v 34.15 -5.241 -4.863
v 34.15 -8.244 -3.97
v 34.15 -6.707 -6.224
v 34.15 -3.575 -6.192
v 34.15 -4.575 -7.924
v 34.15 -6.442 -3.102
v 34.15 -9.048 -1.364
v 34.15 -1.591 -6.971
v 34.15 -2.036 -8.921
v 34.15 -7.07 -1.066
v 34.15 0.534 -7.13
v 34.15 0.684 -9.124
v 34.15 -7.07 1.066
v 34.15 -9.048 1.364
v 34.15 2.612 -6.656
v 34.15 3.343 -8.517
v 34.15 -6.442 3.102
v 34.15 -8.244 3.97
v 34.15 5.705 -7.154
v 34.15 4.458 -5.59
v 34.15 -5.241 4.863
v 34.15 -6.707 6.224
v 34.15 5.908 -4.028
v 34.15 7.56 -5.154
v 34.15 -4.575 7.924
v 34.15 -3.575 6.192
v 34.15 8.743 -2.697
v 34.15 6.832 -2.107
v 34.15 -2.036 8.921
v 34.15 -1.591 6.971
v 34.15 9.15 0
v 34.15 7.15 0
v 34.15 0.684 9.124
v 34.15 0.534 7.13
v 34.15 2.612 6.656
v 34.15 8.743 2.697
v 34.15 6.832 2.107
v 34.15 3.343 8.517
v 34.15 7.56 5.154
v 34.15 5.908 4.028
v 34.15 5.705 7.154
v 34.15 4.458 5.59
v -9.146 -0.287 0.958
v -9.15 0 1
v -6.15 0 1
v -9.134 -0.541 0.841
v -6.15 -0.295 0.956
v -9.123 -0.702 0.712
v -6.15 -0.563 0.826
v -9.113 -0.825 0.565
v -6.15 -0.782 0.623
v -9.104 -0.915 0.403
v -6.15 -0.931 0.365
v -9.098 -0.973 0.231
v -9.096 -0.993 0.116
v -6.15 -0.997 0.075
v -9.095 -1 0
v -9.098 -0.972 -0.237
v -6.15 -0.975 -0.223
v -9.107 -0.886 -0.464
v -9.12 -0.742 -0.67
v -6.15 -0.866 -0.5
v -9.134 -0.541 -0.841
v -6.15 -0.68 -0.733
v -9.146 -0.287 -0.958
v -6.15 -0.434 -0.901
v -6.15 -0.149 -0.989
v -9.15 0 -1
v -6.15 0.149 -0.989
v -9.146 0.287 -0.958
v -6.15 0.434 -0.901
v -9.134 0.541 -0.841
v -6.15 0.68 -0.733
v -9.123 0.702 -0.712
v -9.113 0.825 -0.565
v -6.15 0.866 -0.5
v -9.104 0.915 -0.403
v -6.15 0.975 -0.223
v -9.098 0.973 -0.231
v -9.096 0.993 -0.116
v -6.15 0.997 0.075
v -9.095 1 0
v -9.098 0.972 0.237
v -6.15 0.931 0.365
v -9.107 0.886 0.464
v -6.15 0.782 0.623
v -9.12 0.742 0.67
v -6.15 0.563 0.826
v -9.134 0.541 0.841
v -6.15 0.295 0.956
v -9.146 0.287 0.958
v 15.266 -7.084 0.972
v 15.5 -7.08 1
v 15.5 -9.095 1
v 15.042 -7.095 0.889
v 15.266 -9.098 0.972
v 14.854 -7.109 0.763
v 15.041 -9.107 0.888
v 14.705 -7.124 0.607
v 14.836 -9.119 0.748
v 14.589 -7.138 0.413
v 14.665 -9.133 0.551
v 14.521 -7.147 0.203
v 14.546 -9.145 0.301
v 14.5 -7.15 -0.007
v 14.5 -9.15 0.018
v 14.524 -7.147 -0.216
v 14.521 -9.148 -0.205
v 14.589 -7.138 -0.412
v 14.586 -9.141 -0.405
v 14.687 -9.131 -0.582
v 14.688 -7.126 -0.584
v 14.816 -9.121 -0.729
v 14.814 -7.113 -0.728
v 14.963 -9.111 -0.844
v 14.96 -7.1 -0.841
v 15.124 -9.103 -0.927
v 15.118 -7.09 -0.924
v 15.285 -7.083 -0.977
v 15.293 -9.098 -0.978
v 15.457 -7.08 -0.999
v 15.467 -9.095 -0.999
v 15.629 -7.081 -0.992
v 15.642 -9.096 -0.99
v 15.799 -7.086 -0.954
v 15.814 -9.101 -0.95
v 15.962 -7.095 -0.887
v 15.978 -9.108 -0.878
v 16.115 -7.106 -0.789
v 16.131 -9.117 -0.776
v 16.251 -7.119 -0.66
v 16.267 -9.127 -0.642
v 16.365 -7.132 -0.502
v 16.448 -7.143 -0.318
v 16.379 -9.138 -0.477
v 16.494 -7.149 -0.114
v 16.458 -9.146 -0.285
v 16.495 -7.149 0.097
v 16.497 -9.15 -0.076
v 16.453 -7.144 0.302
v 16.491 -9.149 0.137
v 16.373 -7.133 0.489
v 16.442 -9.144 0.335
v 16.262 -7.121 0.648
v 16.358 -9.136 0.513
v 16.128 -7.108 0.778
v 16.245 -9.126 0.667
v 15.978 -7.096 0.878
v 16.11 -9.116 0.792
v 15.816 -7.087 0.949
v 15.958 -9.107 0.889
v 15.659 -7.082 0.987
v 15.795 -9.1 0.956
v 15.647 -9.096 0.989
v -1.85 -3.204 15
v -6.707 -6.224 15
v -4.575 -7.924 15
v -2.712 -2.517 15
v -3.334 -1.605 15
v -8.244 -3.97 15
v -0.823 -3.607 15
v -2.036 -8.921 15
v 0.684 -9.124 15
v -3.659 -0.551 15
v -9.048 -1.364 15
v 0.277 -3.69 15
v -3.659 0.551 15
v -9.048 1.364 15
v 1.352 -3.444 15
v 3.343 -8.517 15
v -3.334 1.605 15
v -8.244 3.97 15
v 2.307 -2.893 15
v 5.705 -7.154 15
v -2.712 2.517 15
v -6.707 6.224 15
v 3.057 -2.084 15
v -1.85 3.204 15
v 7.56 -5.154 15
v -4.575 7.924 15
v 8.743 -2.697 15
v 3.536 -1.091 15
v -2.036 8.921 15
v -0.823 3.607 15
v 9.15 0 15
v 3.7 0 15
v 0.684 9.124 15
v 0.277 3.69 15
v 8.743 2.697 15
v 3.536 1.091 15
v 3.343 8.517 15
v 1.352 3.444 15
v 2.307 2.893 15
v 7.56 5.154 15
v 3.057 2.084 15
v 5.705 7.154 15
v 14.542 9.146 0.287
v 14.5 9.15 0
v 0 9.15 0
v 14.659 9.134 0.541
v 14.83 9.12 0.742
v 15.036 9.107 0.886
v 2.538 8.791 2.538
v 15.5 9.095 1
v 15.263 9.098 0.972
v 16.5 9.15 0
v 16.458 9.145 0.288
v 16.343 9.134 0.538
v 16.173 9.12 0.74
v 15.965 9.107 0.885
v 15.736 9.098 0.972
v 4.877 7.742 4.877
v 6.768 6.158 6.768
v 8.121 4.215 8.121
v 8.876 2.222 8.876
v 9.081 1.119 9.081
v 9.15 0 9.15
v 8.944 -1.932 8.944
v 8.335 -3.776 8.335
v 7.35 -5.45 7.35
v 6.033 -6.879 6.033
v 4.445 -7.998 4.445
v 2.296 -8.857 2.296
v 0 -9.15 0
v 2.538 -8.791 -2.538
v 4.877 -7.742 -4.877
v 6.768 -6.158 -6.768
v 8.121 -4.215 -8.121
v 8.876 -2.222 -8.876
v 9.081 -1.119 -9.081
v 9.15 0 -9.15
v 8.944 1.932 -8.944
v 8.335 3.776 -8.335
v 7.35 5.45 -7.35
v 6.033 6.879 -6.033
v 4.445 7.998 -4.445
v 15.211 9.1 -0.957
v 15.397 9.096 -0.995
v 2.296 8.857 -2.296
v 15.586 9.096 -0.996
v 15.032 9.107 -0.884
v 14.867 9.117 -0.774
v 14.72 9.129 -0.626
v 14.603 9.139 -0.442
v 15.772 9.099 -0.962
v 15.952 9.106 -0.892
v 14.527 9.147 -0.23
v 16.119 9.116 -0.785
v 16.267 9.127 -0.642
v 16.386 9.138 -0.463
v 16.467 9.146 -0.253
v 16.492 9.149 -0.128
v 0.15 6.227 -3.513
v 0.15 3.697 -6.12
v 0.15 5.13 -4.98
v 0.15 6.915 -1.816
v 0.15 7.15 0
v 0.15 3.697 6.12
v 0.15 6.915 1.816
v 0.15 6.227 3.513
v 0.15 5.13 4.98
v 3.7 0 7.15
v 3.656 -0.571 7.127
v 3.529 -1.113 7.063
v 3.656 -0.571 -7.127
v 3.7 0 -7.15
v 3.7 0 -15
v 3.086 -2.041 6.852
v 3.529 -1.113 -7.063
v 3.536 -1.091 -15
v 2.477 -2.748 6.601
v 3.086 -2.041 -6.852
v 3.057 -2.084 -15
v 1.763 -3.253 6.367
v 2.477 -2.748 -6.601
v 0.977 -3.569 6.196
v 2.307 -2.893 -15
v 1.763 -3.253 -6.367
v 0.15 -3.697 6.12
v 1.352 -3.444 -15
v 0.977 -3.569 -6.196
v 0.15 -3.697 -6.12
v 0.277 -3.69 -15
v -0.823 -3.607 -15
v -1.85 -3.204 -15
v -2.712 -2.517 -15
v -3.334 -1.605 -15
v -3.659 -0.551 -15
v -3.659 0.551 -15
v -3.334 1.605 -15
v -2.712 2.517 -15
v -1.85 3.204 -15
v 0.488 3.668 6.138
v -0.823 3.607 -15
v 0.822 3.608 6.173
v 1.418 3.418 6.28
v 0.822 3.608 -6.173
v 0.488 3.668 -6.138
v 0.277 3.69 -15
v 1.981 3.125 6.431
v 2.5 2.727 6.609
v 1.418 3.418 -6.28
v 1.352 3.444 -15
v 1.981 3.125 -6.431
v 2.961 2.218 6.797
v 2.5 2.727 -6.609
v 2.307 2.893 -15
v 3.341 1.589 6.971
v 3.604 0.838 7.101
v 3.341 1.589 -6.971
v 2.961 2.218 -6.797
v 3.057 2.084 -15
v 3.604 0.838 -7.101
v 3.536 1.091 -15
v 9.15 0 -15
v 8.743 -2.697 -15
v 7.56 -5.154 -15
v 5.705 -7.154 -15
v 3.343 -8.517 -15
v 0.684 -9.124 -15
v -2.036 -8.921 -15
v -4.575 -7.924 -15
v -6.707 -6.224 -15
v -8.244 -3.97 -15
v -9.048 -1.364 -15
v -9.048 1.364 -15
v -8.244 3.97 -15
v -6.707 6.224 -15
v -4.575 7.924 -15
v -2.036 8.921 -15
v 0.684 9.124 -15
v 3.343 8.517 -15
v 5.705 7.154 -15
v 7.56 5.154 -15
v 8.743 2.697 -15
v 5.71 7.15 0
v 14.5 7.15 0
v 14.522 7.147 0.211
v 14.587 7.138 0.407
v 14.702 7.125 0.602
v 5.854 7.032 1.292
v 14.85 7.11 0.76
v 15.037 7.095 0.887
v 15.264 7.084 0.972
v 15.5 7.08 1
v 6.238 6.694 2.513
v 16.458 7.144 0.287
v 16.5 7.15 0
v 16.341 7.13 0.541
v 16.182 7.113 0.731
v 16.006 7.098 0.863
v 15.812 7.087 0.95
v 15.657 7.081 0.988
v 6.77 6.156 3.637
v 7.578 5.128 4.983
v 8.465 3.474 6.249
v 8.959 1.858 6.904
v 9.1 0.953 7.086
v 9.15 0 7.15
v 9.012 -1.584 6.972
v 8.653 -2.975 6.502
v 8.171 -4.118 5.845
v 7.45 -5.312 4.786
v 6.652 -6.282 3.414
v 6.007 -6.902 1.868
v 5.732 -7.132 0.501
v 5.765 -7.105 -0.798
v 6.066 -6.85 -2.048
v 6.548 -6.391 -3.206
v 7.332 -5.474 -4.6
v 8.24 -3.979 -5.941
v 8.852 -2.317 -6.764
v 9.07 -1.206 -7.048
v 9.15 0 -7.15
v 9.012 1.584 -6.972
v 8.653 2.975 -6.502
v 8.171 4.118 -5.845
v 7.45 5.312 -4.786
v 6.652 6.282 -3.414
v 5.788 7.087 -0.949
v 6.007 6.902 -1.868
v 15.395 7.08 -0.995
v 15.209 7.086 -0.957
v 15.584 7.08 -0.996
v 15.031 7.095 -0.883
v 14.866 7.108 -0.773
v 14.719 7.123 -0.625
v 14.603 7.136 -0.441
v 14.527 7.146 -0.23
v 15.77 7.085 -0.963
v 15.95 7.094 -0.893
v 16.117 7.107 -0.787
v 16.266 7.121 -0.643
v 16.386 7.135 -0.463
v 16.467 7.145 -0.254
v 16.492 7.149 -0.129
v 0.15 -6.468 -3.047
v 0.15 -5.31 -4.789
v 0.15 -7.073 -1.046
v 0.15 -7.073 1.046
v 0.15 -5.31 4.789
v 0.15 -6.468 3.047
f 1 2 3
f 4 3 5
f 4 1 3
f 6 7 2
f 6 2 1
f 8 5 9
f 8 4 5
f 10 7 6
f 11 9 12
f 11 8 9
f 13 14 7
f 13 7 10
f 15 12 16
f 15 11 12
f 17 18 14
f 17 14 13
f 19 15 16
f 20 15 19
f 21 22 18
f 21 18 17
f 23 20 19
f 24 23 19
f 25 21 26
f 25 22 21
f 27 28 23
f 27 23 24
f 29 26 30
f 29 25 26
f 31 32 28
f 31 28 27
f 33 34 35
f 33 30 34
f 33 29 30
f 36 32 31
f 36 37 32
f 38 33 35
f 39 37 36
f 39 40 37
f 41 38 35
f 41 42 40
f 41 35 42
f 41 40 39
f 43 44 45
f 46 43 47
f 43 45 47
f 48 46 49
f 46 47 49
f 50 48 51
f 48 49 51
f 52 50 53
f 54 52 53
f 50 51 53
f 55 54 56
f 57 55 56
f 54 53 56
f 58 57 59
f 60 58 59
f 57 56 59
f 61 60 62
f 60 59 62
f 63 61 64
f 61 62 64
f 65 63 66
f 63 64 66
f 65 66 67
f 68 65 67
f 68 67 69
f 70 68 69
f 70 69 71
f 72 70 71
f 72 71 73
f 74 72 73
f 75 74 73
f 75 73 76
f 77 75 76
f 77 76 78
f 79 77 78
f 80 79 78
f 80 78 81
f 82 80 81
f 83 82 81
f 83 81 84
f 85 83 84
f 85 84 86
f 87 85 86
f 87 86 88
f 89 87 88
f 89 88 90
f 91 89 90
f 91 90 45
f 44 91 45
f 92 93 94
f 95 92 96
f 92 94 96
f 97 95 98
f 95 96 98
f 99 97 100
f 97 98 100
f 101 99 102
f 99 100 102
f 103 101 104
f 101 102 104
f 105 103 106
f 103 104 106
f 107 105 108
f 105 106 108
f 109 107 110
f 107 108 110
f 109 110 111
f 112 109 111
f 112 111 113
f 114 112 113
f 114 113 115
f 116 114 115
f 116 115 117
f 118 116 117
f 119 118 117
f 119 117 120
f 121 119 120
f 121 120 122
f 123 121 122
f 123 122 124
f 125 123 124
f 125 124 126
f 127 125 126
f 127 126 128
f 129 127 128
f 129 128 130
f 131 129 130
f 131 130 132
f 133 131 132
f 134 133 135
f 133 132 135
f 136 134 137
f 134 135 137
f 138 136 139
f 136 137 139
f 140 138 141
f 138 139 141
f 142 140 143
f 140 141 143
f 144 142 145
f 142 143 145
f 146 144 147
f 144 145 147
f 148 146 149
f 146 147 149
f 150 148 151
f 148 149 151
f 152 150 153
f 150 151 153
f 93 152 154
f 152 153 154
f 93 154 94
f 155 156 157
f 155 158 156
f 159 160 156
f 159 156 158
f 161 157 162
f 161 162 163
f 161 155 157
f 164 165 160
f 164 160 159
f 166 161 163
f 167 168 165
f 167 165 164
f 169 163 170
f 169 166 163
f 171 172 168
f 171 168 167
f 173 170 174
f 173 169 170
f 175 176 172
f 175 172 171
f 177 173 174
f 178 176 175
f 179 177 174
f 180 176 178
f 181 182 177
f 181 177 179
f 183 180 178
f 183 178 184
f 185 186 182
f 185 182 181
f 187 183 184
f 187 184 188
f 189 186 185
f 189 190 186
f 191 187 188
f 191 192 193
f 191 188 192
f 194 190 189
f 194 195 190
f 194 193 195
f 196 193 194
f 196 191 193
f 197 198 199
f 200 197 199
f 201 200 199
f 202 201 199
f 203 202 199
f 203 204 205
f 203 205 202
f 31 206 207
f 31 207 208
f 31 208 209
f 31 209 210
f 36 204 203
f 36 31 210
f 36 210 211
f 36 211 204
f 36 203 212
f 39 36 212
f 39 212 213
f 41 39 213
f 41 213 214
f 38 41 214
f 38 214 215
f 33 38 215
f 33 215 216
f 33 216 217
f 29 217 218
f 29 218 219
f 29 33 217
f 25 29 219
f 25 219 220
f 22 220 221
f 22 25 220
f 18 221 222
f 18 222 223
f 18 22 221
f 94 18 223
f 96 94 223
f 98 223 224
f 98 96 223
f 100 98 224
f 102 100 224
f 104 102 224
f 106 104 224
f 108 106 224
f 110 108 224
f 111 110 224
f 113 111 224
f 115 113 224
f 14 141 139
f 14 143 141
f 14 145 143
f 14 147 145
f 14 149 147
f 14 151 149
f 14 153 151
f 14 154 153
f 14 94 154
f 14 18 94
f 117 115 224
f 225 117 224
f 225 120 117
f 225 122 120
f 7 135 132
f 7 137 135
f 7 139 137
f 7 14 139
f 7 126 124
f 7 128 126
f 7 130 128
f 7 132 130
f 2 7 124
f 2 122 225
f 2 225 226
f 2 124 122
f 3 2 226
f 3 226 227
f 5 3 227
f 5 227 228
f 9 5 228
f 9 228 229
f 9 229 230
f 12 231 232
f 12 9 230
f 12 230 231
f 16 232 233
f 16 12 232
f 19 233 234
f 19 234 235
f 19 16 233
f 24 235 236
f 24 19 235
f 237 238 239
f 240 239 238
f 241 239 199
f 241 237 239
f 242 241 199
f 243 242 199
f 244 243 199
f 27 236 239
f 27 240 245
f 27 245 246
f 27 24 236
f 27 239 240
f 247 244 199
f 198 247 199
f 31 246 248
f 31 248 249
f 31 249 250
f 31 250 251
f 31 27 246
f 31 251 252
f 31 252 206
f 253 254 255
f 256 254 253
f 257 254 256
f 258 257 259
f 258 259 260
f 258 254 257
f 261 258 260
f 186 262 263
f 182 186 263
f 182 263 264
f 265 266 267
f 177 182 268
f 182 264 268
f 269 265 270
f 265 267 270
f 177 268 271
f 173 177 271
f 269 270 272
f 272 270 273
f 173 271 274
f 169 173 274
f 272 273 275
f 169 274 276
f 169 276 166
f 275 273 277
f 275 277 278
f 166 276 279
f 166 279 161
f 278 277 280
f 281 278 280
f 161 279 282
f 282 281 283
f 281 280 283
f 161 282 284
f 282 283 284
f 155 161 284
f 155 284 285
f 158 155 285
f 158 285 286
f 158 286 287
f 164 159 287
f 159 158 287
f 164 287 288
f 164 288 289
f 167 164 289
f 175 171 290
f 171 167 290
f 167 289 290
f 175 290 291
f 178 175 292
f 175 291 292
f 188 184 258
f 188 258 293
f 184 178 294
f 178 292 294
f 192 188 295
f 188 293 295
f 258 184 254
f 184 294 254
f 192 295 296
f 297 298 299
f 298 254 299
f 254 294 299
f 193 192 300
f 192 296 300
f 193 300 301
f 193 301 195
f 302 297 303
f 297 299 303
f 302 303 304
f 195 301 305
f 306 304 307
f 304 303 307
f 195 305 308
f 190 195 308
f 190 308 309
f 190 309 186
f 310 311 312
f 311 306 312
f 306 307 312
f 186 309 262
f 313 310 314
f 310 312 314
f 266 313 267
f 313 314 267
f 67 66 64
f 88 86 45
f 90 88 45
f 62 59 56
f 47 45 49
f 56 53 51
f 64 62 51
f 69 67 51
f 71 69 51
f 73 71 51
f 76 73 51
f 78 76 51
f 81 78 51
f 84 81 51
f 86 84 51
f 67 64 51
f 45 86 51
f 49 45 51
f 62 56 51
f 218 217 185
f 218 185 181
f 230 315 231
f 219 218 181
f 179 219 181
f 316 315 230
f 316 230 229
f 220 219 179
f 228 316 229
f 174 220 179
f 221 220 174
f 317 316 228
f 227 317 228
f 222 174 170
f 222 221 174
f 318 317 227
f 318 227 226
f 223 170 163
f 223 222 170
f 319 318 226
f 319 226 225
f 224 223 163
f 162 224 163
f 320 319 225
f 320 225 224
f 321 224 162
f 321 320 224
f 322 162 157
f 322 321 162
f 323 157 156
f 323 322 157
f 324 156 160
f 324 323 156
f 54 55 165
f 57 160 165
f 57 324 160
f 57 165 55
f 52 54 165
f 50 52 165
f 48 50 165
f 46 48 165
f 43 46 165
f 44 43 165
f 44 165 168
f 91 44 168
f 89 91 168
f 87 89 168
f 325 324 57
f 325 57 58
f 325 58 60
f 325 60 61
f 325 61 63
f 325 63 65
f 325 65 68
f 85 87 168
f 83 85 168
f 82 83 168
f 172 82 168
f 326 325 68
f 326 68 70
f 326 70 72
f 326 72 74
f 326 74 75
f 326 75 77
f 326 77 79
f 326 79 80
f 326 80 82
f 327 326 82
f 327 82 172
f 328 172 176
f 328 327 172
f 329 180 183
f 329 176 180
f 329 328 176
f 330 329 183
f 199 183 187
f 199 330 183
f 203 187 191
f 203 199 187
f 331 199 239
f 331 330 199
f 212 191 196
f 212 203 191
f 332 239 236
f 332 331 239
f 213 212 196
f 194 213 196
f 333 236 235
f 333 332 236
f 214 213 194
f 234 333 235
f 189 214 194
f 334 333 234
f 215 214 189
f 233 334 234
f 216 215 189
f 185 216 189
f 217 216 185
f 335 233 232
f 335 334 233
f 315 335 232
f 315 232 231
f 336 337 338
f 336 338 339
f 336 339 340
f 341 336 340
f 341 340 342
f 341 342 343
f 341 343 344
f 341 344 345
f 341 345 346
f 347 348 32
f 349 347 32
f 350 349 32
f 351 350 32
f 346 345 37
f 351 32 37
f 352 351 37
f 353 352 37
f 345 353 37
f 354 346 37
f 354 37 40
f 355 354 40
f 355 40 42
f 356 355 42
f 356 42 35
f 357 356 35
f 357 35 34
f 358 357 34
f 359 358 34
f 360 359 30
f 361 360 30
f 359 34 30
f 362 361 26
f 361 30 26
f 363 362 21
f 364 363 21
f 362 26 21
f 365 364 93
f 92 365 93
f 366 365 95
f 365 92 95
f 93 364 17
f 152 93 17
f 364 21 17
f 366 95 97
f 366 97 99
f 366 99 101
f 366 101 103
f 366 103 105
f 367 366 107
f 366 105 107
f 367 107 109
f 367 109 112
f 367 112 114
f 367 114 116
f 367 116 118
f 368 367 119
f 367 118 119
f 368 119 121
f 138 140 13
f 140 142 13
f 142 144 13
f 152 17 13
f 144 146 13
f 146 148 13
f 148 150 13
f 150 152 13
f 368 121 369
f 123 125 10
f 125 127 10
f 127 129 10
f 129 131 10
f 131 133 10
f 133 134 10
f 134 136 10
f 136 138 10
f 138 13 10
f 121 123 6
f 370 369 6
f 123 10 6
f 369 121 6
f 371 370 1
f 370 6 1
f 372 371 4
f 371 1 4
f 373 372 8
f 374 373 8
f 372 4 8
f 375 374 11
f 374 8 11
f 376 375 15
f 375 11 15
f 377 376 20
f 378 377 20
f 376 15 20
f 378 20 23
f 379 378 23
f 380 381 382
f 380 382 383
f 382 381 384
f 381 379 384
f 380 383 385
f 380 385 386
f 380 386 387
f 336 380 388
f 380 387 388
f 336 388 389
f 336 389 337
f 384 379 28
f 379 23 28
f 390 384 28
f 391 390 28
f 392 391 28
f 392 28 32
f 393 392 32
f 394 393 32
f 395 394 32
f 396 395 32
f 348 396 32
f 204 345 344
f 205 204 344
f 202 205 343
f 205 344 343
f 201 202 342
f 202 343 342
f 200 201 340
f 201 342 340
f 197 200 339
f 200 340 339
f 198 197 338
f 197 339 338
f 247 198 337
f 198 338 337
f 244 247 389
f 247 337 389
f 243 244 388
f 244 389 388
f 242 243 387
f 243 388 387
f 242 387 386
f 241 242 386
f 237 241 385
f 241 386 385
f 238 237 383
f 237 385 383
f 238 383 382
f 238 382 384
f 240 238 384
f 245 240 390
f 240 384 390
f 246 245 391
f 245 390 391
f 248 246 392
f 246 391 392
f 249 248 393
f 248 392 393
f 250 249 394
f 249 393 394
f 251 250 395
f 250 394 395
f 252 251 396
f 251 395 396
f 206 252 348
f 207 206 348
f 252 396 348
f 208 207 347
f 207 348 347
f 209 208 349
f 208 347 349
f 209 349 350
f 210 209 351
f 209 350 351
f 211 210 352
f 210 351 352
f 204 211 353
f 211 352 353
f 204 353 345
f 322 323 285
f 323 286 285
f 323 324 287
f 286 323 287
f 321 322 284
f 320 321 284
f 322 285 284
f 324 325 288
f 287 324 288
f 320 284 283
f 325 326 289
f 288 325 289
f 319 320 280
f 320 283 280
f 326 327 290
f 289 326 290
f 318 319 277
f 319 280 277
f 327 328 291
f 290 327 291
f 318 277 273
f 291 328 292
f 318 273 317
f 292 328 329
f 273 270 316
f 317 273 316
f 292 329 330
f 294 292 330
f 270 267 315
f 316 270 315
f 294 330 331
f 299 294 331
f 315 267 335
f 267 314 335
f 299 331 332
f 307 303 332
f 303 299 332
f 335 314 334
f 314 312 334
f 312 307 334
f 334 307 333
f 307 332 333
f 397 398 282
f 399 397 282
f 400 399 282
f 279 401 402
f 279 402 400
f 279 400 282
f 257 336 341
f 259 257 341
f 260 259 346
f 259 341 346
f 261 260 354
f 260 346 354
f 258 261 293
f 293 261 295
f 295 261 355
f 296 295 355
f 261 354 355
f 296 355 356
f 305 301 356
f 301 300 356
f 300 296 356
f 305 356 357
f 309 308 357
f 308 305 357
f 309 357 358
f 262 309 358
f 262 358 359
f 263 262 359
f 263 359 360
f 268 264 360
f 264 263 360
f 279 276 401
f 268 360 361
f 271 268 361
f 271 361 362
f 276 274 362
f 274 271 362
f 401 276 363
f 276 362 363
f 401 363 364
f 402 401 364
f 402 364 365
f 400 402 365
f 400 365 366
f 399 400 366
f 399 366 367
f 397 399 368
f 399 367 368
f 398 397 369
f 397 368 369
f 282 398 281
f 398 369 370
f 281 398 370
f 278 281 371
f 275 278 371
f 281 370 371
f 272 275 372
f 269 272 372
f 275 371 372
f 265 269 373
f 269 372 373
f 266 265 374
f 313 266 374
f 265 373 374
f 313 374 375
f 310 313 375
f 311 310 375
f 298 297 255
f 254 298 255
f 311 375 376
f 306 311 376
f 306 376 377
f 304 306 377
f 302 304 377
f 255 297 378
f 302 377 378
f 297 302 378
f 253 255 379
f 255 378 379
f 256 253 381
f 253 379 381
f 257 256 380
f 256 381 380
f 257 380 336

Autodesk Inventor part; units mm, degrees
ref_plane "XY Plane" through (0, 0, 0) normal (0, 0, 1) x (1, 0, 0)
sketch "Sketch1" plane through (0, 0, 0) normal (0, 0, 1) x (1, 0, 0)
  circle A0 centre (0, 0) radius 3.7
  circle A1 centre (0, 0) radius 9.15
  dimension "d0" = 7.4
  dimension "d1" = 18.3
extrude "Extrusion1" add sketch "Sketch1" along normal mid plane 30
ref_plane "Work Plane1" through (0, 9.15, 0) normal (0, 1, 0) x (-1, 0, 0)
ref_plane "Work Plane2" through (-9.15, 0, 0) normal (1, 0, 0) x (0, 1, 0)
ref_plane "Work Plane4" through (34.15, 0, 0) normal (1, 0, 0) x (0, 1, 0)
ref_plane "Work Plane3" through (9.15, 0, 0) normal (1, 0, 0) x (0, 1, 0)
sketch "Sketch2" plane through (-9.15, 5.7, 0) normal (1, 0, 0) x (0, 1, 0)
  point P0 (-5.7, 0)
  point P1 (-5.7, 0)
hole "Hole1" at (-9.15, 0, 0) direction (1, 0, 0) diameter 2 depth 3
sketch "Sketch4" plane through (34.15, 0, 0) normal (1, 0, 0) x (0, 1, 0)
  circle A0 centre (0, 0) radius 9.15
  circle A1 centre (0, 0) radius 7.15
  dimension "d19" = 14.3
  dimension "d20" = 18.3
extrude "Bottom Extrusion" add sketch "Sketch4" against normal up to surface
sketch "Sketch6" plane through (0, 9.15, 0) normal (0, 1, 0) x (-1, 0, 0)
  line L0 (0, 0) -> (-31, 0) construction
  point P0 (-15.5, 0)
hole "Hole2" at (15.5, 9.15, 0) direction (0, -1, 0) diameter 2 end through all
extrude "Cut for wire" cut sketch "Sketch4" against normal blind 34 contours A1
properties part number "Part6_3DPrint"
